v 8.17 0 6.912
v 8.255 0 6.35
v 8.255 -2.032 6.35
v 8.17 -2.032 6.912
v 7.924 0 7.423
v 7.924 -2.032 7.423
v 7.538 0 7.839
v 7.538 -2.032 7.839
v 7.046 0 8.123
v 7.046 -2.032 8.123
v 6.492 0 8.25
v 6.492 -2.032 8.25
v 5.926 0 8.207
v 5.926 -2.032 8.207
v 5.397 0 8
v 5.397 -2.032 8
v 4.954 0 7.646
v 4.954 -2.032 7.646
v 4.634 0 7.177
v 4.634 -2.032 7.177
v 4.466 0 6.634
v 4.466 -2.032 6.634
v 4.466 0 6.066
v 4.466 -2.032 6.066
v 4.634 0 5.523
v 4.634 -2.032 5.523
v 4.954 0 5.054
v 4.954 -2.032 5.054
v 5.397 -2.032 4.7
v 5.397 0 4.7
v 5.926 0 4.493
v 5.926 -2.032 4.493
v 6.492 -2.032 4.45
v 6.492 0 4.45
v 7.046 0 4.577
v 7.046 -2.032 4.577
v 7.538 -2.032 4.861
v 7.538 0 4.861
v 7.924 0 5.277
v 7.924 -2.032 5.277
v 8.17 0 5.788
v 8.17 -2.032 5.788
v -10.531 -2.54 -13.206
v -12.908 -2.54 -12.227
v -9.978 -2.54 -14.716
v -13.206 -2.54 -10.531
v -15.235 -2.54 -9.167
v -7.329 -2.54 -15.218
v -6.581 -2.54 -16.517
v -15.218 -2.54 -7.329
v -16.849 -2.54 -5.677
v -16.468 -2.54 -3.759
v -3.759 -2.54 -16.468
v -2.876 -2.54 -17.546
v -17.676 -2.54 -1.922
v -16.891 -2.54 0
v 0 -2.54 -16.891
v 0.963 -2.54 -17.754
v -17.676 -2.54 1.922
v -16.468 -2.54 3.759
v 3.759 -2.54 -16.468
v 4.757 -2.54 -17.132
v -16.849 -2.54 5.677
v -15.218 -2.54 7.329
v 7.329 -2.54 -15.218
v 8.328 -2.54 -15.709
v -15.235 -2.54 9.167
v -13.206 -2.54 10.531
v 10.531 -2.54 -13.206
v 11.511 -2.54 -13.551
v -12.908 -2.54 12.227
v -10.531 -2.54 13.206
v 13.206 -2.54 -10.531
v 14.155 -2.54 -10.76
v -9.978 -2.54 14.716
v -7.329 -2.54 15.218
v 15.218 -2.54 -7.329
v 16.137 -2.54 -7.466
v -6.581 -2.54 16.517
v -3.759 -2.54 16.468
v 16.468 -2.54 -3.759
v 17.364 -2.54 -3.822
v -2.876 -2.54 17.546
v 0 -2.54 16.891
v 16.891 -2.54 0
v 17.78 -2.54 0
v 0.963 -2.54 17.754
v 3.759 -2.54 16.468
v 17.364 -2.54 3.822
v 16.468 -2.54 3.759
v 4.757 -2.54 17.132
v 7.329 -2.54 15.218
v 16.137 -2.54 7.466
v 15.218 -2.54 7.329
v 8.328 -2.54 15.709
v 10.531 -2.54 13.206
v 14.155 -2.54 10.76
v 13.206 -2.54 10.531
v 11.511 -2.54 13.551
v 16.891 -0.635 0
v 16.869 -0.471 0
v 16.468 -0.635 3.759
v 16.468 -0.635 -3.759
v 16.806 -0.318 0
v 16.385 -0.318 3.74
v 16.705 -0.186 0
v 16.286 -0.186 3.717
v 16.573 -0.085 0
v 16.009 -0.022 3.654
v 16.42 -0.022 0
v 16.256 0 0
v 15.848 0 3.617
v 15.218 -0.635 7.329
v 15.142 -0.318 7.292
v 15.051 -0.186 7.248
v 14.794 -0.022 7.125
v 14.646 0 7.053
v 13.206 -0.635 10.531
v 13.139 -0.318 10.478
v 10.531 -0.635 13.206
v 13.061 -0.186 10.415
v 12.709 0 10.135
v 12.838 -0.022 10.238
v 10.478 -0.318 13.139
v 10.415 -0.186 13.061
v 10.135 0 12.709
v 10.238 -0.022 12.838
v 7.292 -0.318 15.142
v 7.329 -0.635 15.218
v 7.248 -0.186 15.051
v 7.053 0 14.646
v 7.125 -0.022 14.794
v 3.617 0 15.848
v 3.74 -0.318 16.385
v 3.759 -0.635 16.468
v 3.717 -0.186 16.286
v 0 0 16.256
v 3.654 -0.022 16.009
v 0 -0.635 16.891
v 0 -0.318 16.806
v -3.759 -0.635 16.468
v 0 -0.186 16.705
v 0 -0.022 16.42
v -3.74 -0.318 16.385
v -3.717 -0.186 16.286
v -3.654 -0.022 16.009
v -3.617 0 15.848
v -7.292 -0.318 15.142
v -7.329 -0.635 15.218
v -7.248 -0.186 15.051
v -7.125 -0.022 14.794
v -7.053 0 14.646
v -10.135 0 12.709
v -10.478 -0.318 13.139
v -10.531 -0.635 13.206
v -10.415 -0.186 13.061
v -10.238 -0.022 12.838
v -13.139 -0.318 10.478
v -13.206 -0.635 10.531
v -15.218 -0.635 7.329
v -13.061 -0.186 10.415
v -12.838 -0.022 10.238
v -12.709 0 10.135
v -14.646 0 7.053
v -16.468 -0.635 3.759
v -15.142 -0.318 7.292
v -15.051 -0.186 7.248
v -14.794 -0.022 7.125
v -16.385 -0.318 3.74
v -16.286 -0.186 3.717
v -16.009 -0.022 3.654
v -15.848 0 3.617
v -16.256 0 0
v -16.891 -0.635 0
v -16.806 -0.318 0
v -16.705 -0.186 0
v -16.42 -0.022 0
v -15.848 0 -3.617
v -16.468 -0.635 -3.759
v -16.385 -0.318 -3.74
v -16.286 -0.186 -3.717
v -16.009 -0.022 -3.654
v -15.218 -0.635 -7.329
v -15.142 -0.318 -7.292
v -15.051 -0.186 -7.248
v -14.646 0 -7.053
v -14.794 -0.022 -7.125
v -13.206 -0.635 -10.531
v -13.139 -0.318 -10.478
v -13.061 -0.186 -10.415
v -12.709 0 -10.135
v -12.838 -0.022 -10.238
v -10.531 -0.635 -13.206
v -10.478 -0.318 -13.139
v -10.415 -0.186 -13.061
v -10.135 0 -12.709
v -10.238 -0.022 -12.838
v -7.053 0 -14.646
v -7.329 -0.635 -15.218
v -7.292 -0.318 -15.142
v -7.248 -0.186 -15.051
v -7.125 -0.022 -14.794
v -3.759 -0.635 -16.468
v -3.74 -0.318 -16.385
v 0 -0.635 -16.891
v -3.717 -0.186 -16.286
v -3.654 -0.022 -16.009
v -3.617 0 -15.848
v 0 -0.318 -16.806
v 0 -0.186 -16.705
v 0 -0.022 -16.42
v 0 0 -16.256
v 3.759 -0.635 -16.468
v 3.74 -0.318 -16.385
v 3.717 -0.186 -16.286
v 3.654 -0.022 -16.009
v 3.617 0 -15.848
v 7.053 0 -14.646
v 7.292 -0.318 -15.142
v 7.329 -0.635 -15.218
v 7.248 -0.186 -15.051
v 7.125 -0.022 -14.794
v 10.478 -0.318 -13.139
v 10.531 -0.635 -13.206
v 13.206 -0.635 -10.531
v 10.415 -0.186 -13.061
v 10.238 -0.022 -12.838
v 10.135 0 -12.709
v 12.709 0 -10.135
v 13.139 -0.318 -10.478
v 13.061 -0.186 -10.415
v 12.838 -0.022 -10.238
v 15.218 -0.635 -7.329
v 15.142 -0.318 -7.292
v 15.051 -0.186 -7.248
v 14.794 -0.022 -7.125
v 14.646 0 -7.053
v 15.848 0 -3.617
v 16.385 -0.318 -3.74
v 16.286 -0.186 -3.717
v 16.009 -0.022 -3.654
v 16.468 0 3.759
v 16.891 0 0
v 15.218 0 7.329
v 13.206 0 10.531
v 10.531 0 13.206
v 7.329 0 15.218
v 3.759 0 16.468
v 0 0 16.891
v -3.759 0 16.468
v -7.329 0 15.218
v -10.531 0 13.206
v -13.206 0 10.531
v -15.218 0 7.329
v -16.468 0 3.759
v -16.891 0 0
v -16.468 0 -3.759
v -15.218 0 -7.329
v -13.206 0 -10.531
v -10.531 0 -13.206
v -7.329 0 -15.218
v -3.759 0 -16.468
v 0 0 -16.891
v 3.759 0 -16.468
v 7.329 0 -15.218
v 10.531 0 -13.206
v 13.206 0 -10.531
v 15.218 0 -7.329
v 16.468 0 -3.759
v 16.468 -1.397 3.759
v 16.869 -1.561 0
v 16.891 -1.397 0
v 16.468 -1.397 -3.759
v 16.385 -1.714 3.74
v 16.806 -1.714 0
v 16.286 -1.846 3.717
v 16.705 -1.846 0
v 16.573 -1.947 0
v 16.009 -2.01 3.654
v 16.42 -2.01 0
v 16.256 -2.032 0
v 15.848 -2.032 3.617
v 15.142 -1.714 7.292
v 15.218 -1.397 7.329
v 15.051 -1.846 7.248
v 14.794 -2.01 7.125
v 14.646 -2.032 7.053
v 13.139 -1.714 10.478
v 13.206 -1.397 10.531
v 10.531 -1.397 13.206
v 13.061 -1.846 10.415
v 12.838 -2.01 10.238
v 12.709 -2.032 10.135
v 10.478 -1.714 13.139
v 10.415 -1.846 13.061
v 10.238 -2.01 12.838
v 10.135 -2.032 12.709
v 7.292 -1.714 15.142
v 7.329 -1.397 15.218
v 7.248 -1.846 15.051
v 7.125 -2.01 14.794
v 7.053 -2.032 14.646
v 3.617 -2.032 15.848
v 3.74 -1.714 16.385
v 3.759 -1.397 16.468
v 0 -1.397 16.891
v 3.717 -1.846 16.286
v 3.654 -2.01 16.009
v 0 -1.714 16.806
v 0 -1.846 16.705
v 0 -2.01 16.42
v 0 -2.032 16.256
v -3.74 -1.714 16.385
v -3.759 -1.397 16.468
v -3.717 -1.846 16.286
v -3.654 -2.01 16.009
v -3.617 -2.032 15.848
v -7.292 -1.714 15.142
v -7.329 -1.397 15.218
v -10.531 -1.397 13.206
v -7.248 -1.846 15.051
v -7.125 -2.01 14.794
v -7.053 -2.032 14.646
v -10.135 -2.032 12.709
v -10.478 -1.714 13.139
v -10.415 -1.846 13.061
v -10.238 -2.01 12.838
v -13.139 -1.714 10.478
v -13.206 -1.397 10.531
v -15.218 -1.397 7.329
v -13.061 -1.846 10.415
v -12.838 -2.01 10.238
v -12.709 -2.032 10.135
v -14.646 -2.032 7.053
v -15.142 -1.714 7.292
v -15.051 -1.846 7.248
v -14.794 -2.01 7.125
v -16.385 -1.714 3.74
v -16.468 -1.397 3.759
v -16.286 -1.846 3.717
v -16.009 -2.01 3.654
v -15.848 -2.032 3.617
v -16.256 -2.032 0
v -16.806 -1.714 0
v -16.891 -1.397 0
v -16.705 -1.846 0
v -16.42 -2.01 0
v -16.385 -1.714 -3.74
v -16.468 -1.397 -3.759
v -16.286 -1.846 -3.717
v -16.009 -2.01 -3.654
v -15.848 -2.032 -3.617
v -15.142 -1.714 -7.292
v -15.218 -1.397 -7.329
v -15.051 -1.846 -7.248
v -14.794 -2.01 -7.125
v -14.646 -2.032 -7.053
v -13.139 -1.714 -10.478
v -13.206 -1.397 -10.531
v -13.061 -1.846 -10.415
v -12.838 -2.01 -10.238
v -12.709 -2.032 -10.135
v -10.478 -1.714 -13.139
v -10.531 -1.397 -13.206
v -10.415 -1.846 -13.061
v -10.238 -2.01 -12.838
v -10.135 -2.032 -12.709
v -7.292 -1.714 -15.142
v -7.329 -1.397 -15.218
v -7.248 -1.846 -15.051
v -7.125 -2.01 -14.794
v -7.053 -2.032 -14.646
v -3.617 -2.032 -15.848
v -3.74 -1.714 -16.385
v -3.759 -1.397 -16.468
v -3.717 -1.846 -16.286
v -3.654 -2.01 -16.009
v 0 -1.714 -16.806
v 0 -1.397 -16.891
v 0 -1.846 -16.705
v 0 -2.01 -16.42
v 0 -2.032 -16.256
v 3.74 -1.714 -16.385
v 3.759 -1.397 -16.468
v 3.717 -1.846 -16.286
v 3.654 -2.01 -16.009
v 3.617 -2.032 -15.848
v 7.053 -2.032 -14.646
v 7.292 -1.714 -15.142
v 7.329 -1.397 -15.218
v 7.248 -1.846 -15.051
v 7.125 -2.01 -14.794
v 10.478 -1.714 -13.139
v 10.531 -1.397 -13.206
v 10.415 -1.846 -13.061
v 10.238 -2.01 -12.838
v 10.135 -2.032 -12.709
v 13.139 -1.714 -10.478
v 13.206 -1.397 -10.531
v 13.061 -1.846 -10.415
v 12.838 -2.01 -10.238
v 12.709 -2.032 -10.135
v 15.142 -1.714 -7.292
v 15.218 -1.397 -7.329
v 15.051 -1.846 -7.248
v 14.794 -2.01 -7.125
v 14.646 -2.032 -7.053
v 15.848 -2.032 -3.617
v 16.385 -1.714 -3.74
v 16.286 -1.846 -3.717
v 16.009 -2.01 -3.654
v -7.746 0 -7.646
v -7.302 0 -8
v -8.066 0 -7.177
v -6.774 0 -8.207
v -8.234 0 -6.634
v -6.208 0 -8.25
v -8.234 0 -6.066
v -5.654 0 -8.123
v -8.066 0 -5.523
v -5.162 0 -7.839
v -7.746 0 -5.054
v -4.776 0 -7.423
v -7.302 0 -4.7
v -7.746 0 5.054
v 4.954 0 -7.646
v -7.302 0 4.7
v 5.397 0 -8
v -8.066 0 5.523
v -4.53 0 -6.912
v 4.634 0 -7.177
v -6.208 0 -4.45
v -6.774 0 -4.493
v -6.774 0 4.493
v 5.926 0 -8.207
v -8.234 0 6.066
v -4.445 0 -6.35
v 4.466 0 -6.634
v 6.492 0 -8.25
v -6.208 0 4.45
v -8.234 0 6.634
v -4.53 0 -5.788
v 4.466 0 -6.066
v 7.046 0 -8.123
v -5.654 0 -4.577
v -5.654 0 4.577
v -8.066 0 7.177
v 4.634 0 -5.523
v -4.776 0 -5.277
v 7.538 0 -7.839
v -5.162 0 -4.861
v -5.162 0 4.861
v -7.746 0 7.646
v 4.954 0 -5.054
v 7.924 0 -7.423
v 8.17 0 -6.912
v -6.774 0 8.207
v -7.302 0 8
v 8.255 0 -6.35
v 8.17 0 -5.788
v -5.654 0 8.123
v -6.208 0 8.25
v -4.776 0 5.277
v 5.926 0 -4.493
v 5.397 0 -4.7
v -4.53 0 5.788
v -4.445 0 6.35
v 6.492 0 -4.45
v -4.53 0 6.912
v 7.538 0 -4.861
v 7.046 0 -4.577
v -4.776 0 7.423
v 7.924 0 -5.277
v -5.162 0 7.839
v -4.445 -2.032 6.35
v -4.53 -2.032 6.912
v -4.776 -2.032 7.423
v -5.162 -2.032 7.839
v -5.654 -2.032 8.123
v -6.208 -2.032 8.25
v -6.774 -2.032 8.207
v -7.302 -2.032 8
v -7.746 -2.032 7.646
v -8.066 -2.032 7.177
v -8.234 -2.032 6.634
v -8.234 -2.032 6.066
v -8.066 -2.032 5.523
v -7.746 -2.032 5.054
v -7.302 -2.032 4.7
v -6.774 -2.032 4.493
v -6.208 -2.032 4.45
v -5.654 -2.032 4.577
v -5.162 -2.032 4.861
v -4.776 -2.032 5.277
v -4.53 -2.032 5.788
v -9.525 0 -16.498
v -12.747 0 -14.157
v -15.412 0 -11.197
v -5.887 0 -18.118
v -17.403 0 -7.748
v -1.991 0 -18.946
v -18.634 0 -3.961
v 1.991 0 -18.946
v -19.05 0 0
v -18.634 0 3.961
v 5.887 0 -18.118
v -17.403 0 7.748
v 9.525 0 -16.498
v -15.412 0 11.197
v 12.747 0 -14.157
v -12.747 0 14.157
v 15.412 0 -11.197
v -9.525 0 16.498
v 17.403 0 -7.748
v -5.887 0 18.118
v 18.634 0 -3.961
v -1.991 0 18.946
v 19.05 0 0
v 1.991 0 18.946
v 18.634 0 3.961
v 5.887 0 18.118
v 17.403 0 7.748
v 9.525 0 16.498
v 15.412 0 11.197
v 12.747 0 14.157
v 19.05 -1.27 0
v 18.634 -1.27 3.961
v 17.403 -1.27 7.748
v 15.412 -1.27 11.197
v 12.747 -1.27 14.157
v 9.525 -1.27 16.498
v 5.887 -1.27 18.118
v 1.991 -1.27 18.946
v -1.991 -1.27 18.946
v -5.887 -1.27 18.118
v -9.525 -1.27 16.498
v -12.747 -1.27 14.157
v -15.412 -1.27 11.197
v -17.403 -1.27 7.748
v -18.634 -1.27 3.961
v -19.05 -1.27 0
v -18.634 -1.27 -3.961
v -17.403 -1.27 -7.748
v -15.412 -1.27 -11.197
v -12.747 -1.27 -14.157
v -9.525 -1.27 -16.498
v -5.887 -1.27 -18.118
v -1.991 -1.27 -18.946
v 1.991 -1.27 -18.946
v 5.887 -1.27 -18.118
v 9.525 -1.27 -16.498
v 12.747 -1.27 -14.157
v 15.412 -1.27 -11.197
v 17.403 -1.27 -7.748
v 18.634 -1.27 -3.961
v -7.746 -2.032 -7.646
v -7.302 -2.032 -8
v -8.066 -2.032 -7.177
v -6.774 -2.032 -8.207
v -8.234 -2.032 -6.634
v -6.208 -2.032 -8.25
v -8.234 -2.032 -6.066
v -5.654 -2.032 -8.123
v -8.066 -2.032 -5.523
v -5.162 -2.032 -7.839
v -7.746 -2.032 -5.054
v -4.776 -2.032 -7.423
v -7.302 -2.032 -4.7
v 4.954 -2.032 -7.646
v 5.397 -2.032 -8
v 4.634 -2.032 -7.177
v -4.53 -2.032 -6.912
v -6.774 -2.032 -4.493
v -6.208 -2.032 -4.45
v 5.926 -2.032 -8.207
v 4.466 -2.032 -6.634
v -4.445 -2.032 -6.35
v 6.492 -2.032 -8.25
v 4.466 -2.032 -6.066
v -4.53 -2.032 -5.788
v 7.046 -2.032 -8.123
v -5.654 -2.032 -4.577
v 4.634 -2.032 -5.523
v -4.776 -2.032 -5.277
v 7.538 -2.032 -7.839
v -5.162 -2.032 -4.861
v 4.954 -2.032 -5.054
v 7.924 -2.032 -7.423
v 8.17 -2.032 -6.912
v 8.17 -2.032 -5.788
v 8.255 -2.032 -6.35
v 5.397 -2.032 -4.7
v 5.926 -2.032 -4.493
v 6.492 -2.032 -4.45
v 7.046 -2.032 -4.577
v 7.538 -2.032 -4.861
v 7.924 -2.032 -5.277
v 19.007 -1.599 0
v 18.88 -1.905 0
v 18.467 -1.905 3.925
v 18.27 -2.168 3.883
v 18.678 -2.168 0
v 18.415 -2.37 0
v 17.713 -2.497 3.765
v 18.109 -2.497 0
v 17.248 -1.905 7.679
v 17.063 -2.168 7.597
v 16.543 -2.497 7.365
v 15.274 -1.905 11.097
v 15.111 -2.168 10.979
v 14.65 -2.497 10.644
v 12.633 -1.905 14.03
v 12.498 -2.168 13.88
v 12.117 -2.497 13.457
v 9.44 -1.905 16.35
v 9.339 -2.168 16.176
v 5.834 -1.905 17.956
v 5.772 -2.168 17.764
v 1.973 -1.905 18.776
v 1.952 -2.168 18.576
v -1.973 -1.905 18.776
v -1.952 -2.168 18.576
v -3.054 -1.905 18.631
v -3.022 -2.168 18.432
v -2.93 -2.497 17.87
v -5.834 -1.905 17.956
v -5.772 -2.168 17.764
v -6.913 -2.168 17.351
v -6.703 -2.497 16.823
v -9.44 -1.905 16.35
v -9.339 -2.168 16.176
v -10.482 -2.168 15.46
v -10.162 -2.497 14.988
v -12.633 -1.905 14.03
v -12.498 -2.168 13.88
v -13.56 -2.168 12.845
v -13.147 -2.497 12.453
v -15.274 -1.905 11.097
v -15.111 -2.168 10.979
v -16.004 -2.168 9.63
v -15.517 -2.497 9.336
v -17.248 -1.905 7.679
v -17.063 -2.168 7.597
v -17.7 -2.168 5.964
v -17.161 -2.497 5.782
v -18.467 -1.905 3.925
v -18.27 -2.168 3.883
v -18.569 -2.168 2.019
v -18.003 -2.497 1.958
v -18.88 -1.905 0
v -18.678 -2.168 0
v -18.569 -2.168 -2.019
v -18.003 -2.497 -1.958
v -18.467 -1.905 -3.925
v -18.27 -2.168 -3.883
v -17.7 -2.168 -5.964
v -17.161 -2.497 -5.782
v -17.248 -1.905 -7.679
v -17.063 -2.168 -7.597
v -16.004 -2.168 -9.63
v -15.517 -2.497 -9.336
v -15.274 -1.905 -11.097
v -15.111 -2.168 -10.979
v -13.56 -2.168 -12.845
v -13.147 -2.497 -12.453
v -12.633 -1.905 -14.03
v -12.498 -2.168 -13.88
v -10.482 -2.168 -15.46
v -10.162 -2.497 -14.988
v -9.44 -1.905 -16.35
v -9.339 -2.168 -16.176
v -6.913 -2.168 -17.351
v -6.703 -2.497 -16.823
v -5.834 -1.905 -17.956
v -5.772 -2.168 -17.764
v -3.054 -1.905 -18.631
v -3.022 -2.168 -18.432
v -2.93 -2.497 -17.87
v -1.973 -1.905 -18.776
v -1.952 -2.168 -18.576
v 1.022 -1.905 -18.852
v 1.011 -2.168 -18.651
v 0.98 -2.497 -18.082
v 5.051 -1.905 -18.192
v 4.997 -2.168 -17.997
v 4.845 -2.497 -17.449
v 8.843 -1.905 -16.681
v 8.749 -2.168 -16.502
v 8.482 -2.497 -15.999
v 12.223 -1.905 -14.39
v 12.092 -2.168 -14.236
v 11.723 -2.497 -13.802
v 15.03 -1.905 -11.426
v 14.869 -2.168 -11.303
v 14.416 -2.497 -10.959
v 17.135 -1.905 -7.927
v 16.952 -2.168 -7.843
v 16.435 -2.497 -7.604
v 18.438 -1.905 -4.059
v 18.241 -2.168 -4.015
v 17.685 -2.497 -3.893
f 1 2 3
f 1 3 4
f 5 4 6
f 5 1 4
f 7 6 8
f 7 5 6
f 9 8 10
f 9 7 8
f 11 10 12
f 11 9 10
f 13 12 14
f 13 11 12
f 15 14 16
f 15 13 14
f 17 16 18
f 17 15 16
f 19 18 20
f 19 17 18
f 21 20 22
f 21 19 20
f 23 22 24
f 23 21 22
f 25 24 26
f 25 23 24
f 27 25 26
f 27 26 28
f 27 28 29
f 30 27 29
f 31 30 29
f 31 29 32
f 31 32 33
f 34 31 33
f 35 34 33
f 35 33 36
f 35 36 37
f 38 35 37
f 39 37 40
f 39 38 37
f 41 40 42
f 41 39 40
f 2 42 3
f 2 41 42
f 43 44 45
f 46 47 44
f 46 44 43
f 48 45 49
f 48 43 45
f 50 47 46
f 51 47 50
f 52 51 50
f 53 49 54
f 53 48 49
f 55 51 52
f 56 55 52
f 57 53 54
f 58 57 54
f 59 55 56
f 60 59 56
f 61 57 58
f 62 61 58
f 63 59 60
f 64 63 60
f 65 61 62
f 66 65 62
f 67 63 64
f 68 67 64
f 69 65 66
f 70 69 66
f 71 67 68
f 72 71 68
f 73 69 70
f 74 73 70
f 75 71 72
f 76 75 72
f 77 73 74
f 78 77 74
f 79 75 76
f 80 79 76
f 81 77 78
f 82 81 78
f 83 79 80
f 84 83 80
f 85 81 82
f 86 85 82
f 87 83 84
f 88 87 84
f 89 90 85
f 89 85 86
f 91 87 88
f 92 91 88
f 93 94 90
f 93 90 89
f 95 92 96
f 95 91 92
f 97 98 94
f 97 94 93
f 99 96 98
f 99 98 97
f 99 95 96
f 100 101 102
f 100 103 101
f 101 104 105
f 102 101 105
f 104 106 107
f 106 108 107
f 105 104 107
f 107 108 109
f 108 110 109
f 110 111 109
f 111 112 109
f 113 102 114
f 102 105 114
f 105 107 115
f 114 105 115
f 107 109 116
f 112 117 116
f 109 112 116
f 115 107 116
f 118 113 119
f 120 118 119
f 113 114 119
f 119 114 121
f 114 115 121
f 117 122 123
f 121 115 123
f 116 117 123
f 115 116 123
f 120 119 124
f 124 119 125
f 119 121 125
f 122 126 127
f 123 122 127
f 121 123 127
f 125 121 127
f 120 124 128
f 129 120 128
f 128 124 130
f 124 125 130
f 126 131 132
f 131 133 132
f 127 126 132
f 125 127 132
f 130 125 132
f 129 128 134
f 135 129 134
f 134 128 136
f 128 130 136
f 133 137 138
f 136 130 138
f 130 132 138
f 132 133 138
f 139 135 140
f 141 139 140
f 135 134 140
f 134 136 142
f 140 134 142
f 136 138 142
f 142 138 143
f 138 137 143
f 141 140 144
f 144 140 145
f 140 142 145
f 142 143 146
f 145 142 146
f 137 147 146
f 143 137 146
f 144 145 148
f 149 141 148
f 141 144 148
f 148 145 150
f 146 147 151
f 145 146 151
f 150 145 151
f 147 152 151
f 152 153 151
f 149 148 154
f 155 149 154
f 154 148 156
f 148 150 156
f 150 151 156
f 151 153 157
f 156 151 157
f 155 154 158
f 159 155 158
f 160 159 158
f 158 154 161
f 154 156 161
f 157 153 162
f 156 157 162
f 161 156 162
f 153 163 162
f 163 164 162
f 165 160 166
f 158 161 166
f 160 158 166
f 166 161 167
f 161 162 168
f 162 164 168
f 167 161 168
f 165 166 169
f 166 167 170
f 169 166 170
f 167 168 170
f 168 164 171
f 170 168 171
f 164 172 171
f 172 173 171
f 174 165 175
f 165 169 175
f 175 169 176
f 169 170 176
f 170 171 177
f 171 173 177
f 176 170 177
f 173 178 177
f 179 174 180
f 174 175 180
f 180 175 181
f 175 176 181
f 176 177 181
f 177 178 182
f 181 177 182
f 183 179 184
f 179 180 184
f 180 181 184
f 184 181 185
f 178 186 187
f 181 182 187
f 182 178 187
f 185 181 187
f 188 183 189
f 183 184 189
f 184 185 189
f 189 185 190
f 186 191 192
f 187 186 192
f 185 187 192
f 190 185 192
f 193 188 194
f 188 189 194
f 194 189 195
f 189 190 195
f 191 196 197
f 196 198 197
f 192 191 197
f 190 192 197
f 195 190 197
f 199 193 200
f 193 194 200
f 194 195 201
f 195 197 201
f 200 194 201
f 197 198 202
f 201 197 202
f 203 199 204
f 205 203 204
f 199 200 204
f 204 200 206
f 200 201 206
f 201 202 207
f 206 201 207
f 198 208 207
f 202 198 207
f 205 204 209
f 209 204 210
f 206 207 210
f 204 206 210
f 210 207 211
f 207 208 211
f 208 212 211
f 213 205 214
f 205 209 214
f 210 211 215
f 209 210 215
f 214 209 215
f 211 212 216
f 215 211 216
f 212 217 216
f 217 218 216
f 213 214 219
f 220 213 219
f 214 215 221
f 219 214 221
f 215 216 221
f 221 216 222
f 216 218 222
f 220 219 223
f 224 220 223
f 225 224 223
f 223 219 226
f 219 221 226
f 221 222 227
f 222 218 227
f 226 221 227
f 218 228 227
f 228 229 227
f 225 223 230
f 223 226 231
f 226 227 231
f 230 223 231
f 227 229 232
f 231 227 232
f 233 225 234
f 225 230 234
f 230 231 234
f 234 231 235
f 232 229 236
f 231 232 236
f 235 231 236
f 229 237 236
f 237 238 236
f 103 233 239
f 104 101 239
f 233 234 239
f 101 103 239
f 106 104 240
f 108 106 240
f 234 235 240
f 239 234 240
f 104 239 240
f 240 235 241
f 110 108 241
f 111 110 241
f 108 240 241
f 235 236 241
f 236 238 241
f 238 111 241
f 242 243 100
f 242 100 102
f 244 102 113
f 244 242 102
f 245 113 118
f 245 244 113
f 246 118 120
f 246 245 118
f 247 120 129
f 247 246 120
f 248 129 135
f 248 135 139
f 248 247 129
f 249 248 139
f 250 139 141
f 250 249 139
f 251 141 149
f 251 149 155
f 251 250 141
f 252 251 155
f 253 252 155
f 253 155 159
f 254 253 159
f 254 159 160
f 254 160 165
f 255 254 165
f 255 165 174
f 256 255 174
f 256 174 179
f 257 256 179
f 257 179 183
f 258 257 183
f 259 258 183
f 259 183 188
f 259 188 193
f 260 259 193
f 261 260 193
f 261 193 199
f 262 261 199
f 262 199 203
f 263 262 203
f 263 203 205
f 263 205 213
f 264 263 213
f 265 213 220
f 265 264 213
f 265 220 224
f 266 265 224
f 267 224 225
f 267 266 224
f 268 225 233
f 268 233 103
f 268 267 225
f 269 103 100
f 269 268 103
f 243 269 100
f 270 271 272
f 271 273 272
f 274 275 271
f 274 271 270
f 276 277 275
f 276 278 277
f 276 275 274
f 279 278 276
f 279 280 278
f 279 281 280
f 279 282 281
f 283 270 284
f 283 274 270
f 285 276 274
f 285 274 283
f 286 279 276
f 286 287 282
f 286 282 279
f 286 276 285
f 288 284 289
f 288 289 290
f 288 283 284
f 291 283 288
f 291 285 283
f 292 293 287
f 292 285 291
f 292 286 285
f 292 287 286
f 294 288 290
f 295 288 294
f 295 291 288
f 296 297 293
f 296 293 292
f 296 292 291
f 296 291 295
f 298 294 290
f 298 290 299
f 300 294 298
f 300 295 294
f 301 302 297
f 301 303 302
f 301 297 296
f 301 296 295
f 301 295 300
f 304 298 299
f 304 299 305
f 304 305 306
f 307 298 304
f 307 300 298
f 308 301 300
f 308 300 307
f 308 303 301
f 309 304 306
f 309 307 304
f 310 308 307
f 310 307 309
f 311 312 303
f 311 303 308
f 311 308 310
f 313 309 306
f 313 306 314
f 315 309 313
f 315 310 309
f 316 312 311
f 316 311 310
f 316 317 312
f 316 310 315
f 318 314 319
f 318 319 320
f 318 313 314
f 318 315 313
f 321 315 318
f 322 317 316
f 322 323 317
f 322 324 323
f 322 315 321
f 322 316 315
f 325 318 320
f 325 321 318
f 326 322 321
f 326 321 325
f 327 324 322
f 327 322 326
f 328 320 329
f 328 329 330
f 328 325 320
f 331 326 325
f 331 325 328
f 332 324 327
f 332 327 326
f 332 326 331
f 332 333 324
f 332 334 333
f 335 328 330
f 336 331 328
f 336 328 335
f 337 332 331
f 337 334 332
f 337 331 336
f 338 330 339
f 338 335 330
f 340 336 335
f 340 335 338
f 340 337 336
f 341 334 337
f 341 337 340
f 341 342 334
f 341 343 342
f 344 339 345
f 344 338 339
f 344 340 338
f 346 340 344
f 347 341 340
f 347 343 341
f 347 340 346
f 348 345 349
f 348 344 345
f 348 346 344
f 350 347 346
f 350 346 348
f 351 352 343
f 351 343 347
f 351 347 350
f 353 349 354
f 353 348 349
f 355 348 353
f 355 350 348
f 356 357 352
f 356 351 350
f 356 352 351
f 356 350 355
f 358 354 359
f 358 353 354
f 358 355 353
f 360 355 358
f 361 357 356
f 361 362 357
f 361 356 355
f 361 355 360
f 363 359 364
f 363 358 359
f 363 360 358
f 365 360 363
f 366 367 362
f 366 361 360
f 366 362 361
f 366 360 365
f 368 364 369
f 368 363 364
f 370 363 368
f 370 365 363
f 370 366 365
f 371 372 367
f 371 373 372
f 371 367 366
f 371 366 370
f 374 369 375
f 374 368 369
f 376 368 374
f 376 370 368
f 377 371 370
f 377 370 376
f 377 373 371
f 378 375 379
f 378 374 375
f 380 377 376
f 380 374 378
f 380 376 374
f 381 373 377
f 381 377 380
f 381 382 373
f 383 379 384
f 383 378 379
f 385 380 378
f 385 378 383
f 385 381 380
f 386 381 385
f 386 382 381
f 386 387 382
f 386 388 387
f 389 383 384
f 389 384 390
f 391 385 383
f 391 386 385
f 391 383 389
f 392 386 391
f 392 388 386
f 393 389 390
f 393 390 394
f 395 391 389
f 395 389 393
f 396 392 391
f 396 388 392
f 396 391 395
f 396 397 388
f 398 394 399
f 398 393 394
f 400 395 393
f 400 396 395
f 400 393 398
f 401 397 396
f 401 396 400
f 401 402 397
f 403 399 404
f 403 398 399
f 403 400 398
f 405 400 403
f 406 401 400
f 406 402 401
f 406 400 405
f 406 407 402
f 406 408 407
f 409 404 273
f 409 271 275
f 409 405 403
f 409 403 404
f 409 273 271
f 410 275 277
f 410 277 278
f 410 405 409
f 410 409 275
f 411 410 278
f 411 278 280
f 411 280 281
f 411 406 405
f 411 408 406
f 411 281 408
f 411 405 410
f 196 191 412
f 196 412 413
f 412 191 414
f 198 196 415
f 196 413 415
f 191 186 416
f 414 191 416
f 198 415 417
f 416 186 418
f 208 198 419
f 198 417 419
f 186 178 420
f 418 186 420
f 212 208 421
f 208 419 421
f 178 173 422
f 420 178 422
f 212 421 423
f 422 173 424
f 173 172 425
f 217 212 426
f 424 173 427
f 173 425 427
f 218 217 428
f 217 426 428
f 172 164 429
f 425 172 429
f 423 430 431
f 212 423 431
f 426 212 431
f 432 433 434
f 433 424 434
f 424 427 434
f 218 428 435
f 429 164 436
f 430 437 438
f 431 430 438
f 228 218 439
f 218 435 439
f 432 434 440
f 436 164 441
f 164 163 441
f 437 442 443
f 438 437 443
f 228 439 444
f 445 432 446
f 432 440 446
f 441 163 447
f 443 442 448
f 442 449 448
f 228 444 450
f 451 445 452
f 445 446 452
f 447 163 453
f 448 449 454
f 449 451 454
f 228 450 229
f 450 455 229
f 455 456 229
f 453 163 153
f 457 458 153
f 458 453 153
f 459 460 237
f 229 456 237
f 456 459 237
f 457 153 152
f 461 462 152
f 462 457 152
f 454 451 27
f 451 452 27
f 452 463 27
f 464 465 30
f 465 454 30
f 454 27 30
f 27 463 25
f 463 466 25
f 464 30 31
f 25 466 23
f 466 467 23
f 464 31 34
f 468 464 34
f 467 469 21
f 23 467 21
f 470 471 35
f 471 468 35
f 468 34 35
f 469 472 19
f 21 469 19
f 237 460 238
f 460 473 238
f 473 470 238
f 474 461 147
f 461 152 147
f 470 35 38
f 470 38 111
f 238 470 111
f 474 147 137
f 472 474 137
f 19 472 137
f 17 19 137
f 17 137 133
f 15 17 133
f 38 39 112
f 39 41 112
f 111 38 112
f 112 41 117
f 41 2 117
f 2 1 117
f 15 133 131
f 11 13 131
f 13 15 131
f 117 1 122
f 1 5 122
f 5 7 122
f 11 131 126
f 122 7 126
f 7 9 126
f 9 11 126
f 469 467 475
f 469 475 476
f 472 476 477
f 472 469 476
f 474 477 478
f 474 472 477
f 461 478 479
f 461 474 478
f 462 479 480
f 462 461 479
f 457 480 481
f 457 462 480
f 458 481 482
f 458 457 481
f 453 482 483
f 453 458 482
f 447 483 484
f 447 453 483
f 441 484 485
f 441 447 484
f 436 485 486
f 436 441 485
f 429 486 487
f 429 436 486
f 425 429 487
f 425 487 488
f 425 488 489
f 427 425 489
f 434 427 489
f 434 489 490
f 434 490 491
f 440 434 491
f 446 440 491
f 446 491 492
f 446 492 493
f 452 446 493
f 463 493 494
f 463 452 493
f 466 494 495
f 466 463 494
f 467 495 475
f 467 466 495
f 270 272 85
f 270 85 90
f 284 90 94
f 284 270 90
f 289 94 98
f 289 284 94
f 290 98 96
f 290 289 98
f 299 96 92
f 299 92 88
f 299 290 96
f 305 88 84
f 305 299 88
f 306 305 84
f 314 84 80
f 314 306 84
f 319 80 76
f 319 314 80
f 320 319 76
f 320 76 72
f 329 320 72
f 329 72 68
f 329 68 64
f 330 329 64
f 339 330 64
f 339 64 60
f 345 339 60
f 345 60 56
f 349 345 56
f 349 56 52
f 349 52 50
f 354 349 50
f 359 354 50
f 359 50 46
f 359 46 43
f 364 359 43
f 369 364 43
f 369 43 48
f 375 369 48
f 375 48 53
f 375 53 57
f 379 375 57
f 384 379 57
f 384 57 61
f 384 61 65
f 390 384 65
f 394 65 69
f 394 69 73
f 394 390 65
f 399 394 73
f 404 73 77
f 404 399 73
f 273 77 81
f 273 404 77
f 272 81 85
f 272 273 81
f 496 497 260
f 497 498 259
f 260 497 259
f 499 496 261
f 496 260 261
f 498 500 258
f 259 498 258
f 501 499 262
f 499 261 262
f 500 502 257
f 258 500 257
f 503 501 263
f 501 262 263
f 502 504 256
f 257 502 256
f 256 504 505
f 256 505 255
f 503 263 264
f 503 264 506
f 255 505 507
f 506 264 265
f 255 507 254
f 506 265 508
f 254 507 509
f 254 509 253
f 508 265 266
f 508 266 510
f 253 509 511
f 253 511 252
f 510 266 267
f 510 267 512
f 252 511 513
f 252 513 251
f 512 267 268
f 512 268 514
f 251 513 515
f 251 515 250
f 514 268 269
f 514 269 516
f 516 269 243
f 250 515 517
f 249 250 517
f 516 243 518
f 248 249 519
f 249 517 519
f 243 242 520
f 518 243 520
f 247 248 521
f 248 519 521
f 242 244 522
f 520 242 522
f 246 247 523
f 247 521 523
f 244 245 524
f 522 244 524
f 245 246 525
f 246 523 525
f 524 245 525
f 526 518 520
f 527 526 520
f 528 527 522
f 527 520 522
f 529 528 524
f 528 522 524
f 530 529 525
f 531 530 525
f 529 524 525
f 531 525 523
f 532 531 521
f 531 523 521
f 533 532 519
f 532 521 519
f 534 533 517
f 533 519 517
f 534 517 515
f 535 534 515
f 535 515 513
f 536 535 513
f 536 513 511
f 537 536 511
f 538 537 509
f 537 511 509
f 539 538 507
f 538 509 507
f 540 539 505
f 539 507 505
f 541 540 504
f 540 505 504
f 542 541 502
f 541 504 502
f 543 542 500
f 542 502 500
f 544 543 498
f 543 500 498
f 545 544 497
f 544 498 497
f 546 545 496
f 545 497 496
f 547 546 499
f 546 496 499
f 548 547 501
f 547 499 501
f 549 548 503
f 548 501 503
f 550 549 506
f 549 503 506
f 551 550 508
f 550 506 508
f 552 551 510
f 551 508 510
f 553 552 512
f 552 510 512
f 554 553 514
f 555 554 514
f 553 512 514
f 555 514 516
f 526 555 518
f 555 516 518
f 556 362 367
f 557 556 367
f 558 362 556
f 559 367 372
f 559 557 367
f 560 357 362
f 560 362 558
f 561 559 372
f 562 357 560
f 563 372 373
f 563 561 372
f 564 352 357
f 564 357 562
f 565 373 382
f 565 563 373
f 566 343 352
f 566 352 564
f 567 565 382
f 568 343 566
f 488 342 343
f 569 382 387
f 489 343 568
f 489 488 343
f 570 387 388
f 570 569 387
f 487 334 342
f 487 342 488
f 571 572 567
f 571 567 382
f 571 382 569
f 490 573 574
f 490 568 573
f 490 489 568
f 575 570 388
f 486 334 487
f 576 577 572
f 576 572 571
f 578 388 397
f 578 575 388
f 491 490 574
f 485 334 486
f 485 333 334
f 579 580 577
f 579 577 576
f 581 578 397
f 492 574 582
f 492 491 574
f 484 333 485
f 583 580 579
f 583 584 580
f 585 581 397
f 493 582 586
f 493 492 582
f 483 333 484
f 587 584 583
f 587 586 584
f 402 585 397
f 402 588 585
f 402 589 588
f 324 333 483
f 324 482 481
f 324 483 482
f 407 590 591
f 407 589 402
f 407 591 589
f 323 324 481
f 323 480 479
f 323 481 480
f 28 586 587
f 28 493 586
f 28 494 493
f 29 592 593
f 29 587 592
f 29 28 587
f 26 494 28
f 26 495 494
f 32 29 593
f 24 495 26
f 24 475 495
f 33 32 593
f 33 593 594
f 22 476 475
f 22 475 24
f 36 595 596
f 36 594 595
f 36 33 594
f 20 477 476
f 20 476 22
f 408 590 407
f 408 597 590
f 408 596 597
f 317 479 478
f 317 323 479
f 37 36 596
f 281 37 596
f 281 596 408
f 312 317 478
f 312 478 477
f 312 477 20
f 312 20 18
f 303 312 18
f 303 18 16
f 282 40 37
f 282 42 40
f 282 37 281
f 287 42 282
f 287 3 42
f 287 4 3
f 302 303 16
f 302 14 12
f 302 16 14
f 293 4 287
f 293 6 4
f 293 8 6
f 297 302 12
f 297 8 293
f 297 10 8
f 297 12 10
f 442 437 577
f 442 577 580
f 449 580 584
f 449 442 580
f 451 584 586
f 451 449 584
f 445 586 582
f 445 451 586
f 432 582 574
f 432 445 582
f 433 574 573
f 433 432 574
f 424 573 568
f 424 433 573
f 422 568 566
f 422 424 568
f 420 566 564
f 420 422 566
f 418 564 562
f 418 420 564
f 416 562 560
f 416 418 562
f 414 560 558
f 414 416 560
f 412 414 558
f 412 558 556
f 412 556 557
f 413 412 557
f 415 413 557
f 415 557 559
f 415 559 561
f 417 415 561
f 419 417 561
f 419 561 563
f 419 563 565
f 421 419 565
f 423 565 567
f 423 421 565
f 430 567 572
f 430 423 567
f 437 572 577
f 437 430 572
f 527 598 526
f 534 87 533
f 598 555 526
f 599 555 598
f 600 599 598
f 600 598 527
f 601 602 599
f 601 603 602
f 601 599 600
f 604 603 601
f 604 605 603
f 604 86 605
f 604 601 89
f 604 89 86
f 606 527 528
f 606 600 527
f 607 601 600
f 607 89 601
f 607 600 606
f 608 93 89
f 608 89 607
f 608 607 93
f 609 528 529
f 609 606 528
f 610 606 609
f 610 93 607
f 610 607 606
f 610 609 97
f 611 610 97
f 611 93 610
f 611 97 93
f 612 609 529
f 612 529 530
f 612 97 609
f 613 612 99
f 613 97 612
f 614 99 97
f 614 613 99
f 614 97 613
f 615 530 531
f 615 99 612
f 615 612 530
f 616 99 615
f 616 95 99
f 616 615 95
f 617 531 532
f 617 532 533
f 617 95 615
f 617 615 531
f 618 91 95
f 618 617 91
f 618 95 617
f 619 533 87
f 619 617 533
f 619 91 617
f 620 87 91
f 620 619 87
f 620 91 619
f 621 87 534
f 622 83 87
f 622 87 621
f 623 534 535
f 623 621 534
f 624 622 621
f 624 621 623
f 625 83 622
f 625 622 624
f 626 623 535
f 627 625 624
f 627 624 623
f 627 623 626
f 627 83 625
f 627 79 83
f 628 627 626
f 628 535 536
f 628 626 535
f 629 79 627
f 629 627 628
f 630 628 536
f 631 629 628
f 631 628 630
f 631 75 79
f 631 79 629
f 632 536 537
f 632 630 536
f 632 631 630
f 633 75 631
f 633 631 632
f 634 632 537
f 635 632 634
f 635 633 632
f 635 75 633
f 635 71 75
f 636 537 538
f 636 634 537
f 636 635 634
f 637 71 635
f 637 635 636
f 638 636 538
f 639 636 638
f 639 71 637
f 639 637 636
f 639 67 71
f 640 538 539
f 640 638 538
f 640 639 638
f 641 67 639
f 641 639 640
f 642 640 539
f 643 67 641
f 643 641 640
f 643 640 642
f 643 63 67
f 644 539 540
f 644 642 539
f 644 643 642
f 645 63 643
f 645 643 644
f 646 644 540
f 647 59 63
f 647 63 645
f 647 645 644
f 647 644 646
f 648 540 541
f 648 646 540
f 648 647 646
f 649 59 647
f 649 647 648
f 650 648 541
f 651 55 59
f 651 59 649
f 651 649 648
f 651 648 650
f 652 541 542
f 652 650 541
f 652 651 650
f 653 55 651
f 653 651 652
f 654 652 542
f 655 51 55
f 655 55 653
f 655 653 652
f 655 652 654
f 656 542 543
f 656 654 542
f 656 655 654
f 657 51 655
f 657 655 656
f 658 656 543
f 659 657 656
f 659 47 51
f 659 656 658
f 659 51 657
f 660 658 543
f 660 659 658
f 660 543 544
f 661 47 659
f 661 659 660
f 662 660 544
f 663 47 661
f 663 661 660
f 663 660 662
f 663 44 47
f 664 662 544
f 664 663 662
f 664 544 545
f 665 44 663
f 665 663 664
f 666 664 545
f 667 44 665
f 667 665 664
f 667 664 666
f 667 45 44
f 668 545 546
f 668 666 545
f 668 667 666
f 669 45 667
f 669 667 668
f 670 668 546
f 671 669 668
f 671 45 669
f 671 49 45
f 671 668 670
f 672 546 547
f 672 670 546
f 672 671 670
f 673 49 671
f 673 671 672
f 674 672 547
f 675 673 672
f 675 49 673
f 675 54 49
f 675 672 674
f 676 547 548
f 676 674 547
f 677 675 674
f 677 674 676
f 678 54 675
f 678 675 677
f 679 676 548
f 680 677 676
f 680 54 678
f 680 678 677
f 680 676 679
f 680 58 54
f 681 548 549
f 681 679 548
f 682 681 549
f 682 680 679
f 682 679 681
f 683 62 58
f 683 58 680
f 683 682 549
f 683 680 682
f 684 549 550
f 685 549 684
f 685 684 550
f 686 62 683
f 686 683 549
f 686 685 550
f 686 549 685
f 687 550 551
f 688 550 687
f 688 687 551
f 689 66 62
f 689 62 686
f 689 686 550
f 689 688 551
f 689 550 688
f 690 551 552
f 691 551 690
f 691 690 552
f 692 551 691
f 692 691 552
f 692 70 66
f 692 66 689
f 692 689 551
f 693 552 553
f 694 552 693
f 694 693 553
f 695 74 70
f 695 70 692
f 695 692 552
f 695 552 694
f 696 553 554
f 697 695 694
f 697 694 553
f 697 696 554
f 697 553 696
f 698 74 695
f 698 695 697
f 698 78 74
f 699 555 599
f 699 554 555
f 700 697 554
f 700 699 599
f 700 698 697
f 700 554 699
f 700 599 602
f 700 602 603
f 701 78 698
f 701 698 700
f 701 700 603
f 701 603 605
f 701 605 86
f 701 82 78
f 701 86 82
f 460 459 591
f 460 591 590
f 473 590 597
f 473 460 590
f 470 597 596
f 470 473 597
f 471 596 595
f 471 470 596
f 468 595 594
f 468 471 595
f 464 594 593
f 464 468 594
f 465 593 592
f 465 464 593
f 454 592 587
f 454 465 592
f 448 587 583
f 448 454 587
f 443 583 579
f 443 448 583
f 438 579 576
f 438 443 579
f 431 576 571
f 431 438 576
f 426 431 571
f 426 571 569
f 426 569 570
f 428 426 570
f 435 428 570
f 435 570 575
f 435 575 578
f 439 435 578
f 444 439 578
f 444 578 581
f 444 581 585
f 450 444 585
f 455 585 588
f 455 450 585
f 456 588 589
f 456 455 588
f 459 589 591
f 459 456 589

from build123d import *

# Parameters (mm, degrees)
F0_R     = 16.891
F0_R_2   = 1.905
F1_DEPTH = 2.032
F2_R     = 0.635
F0_R_3   = 19.05
F3_DEPTH = 2.54
F4_R     = 1.27


with BuildPart() as f1:
    # F0 (on Front) → F1 (new body)
    with BuildSketch(Plane.XZ):
        Circle(F0_R)
        with Locations((-6.35, -6.35)):
            Circle(F0_R_2, mode=Mode.SUBTRACT)
        with Locations((6.35, -6.35)):
            Circle(F0_R_2, mode=Mode.SUBTRACT)
        with Locations((-6.35, 6.35)):
            Circle(F0_R_2, mode=Mode.SUBTRACT)
        with Locations((6.35, 6.35)):
            Circle(F0_R_2, mode=Mode.SUBTRACT)
    extrude(amount=F1_DEPTH)

    # F2
    f2_edges = [f1.edges().sort_by_distance(p)[0] for p in [
        (-16.891, -2.032, 0),
        (-16.891, 0, 0),
    ]]
    fillet(f2_edges, radius=F2_R)

    # F0 (on Front) → F3 (join)
    with BuildSketch(Plane.XZ):
        Circle(F0_R_3)
        Circle(F0_R, mode=Mode.SUBTRACT)
    extrude(amount=F3_DEPTH)

    # F4
    f4_edges = [f1.edges().sort_by_distance(p)[0] for p in [
        (-19.05, -2.54, 0),
    ]]
    fillet(f4_edges, radius=F4_R)


solid = f1.part
